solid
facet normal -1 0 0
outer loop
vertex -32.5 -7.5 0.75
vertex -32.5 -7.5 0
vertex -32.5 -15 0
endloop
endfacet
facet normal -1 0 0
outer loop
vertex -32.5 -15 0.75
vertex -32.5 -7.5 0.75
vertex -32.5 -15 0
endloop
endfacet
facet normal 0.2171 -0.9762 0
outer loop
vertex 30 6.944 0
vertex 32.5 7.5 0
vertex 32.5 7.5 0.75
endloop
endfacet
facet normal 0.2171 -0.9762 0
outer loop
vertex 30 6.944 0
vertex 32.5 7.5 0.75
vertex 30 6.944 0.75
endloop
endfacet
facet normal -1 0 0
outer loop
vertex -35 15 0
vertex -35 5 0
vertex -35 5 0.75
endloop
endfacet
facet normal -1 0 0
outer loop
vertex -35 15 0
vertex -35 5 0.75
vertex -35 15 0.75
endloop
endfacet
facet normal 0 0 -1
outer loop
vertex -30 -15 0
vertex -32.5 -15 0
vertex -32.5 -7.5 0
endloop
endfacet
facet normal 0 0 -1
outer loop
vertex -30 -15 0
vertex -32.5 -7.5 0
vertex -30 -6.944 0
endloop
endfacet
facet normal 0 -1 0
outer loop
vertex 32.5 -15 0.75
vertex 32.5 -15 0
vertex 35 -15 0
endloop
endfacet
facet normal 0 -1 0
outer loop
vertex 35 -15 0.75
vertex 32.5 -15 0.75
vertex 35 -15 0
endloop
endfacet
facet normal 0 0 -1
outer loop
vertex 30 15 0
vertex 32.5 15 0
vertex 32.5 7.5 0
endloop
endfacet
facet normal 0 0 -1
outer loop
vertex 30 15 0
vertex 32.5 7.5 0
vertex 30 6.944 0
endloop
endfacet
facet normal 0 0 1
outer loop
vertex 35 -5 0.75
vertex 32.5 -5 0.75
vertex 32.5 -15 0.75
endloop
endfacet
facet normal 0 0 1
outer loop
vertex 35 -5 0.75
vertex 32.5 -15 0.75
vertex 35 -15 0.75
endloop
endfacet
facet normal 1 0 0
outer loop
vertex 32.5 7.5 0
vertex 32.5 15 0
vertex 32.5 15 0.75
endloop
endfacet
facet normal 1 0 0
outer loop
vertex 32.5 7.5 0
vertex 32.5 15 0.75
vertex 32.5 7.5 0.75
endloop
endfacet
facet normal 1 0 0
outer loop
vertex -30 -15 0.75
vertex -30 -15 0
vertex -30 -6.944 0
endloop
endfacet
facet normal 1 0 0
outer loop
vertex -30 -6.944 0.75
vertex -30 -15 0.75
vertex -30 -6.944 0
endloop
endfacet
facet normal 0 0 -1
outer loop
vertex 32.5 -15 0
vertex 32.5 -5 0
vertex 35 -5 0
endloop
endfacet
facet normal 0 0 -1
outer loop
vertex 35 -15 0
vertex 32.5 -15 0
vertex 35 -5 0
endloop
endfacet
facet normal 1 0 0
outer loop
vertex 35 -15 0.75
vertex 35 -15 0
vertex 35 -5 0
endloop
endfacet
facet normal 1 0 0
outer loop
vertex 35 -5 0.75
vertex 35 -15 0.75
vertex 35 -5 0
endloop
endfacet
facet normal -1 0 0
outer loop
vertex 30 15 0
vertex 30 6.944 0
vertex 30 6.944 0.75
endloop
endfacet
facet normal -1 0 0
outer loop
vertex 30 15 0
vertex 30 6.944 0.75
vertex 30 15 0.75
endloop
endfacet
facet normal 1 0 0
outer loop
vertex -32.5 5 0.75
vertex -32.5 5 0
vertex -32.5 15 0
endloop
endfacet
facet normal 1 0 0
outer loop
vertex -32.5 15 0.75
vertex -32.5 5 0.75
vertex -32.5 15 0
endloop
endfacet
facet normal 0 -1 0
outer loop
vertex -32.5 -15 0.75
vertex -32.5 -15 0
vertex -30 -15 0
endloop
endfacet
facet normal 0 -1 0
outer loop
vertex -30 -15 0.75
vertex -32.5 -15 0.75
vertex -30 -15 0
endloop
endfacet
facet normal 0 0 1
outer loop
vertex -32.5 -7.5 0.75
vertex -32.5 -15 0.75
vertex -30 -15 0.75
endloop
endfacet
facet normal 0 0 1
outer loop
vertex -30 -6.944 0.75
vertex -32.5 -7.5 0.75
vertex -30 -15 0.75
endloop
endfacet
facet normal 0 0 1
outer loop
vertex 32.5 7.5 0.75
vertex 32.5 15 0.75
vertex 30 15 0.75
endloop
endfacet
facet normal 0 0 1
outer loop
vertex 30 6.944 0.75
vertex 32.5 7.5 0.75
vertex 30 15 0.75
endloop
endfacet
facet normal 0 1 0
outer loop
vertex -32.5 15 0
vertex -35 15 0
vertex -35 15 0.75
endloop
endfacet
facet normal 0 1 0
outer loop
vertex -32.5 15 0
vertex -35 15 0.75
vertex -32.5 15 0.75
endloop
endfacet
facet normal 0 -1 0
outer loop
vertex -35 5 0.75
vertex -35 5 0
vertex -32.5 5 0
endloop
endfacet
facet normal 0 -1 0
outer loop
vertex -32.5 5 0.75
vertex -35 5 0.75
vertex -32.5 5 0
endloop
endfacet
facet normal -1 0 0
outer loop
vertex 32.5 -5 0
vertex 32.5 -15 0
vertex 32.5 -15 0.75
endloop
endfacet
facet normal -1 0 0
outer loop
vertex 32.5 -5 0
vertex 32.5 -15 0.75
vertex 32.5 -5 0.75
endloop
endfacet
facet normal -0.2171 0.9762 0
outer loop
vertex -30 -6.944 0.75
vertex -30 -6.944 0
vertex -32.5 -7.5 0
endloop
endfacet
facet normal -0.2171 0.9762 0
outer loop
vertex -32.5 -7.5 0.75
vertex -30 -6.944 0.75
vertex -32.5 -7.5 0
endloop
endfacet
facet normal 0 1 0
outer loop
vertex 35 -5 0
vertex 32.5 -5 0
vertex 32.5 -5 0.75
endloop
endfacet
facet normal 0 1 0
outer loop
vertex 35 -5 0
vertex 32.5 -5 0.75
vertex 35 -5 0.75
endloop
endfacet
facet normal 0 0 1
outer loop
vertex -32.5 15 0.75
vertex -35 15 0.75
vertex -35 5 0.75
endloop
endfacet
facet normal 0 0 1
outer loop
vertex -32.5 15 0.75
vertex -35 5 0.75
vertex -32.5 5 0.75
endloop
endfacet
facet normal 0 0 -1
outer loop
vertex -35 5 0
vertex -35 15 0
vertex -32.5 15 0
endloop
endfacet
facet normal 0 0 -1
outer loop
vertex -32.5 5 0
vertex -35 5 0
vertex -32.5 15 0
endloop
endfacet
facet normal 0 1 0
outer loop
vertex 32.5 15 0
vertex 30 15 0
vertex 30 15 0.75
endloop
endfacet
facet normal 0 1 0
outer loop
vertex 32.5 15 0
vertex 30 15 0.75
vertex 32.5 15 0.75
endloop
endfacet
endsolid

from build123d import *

# Parameters (mm, degrees)
SKETCH1_W             = 2.5
SKETCH1_H             = 10
BOSS_EXTRUDE1_DEPTH   = 0.75
BOSS_EXTRUDE1_2_DEPTH = 0.75
BOSS_EXTRUDE1_3_DEPTH = 0.75
BOSS_EXTRUDE1_4_DEPTH = 0.75


with BuildPart() as part:
    # Sketch1 → Boss-Extrude1 (new body)
    with BuildSketch(Plane.XY):
        with Locations((-33.75, 10)):
            Rectangle(SKETCH1_W, SKETCH1_H)
    extrude(amount=BOSS_EXTRUDE1_DEPTH)


with BuildPart() as body_2:
    # Sketch1 → Boss-Extrude1 2 (new body)
    with BuildSketch(Plane.XY):
        Polygon((30, 15), (32.5, 15), (32.5, 7.5), (30, 6.944444444), align=None)
    extrude(amount=BOSS_EXTRUDE1_2_DEPTH)


with BuildPart() as body_3:
    # Sketch1 → Boss-Extrude1 3 (new body)
    with BuildSketch(Plane.XY):
        Polygon((-32.5, -7.5), (-32.5, -15), (-30, -15), (-30, -6.944444444), align=None)
    extrude(amount=BOSS_EXTRUDE1_3_DEPTH)


with BuildPart() as body_4:
    # Sketch1 → Boss-Extrude1 4 (new body)
    with BuildSketch(Plane.XY):
        with Locations((33.75, -10)):
            Rectangle(SKETCH1_W, SKETCH1_H)
    extrude(amount=BOSS_EXTRUDE1_4_DEPTH)


solid = Compound([part.part, body_2.part, body_3.part, body_4.part])
